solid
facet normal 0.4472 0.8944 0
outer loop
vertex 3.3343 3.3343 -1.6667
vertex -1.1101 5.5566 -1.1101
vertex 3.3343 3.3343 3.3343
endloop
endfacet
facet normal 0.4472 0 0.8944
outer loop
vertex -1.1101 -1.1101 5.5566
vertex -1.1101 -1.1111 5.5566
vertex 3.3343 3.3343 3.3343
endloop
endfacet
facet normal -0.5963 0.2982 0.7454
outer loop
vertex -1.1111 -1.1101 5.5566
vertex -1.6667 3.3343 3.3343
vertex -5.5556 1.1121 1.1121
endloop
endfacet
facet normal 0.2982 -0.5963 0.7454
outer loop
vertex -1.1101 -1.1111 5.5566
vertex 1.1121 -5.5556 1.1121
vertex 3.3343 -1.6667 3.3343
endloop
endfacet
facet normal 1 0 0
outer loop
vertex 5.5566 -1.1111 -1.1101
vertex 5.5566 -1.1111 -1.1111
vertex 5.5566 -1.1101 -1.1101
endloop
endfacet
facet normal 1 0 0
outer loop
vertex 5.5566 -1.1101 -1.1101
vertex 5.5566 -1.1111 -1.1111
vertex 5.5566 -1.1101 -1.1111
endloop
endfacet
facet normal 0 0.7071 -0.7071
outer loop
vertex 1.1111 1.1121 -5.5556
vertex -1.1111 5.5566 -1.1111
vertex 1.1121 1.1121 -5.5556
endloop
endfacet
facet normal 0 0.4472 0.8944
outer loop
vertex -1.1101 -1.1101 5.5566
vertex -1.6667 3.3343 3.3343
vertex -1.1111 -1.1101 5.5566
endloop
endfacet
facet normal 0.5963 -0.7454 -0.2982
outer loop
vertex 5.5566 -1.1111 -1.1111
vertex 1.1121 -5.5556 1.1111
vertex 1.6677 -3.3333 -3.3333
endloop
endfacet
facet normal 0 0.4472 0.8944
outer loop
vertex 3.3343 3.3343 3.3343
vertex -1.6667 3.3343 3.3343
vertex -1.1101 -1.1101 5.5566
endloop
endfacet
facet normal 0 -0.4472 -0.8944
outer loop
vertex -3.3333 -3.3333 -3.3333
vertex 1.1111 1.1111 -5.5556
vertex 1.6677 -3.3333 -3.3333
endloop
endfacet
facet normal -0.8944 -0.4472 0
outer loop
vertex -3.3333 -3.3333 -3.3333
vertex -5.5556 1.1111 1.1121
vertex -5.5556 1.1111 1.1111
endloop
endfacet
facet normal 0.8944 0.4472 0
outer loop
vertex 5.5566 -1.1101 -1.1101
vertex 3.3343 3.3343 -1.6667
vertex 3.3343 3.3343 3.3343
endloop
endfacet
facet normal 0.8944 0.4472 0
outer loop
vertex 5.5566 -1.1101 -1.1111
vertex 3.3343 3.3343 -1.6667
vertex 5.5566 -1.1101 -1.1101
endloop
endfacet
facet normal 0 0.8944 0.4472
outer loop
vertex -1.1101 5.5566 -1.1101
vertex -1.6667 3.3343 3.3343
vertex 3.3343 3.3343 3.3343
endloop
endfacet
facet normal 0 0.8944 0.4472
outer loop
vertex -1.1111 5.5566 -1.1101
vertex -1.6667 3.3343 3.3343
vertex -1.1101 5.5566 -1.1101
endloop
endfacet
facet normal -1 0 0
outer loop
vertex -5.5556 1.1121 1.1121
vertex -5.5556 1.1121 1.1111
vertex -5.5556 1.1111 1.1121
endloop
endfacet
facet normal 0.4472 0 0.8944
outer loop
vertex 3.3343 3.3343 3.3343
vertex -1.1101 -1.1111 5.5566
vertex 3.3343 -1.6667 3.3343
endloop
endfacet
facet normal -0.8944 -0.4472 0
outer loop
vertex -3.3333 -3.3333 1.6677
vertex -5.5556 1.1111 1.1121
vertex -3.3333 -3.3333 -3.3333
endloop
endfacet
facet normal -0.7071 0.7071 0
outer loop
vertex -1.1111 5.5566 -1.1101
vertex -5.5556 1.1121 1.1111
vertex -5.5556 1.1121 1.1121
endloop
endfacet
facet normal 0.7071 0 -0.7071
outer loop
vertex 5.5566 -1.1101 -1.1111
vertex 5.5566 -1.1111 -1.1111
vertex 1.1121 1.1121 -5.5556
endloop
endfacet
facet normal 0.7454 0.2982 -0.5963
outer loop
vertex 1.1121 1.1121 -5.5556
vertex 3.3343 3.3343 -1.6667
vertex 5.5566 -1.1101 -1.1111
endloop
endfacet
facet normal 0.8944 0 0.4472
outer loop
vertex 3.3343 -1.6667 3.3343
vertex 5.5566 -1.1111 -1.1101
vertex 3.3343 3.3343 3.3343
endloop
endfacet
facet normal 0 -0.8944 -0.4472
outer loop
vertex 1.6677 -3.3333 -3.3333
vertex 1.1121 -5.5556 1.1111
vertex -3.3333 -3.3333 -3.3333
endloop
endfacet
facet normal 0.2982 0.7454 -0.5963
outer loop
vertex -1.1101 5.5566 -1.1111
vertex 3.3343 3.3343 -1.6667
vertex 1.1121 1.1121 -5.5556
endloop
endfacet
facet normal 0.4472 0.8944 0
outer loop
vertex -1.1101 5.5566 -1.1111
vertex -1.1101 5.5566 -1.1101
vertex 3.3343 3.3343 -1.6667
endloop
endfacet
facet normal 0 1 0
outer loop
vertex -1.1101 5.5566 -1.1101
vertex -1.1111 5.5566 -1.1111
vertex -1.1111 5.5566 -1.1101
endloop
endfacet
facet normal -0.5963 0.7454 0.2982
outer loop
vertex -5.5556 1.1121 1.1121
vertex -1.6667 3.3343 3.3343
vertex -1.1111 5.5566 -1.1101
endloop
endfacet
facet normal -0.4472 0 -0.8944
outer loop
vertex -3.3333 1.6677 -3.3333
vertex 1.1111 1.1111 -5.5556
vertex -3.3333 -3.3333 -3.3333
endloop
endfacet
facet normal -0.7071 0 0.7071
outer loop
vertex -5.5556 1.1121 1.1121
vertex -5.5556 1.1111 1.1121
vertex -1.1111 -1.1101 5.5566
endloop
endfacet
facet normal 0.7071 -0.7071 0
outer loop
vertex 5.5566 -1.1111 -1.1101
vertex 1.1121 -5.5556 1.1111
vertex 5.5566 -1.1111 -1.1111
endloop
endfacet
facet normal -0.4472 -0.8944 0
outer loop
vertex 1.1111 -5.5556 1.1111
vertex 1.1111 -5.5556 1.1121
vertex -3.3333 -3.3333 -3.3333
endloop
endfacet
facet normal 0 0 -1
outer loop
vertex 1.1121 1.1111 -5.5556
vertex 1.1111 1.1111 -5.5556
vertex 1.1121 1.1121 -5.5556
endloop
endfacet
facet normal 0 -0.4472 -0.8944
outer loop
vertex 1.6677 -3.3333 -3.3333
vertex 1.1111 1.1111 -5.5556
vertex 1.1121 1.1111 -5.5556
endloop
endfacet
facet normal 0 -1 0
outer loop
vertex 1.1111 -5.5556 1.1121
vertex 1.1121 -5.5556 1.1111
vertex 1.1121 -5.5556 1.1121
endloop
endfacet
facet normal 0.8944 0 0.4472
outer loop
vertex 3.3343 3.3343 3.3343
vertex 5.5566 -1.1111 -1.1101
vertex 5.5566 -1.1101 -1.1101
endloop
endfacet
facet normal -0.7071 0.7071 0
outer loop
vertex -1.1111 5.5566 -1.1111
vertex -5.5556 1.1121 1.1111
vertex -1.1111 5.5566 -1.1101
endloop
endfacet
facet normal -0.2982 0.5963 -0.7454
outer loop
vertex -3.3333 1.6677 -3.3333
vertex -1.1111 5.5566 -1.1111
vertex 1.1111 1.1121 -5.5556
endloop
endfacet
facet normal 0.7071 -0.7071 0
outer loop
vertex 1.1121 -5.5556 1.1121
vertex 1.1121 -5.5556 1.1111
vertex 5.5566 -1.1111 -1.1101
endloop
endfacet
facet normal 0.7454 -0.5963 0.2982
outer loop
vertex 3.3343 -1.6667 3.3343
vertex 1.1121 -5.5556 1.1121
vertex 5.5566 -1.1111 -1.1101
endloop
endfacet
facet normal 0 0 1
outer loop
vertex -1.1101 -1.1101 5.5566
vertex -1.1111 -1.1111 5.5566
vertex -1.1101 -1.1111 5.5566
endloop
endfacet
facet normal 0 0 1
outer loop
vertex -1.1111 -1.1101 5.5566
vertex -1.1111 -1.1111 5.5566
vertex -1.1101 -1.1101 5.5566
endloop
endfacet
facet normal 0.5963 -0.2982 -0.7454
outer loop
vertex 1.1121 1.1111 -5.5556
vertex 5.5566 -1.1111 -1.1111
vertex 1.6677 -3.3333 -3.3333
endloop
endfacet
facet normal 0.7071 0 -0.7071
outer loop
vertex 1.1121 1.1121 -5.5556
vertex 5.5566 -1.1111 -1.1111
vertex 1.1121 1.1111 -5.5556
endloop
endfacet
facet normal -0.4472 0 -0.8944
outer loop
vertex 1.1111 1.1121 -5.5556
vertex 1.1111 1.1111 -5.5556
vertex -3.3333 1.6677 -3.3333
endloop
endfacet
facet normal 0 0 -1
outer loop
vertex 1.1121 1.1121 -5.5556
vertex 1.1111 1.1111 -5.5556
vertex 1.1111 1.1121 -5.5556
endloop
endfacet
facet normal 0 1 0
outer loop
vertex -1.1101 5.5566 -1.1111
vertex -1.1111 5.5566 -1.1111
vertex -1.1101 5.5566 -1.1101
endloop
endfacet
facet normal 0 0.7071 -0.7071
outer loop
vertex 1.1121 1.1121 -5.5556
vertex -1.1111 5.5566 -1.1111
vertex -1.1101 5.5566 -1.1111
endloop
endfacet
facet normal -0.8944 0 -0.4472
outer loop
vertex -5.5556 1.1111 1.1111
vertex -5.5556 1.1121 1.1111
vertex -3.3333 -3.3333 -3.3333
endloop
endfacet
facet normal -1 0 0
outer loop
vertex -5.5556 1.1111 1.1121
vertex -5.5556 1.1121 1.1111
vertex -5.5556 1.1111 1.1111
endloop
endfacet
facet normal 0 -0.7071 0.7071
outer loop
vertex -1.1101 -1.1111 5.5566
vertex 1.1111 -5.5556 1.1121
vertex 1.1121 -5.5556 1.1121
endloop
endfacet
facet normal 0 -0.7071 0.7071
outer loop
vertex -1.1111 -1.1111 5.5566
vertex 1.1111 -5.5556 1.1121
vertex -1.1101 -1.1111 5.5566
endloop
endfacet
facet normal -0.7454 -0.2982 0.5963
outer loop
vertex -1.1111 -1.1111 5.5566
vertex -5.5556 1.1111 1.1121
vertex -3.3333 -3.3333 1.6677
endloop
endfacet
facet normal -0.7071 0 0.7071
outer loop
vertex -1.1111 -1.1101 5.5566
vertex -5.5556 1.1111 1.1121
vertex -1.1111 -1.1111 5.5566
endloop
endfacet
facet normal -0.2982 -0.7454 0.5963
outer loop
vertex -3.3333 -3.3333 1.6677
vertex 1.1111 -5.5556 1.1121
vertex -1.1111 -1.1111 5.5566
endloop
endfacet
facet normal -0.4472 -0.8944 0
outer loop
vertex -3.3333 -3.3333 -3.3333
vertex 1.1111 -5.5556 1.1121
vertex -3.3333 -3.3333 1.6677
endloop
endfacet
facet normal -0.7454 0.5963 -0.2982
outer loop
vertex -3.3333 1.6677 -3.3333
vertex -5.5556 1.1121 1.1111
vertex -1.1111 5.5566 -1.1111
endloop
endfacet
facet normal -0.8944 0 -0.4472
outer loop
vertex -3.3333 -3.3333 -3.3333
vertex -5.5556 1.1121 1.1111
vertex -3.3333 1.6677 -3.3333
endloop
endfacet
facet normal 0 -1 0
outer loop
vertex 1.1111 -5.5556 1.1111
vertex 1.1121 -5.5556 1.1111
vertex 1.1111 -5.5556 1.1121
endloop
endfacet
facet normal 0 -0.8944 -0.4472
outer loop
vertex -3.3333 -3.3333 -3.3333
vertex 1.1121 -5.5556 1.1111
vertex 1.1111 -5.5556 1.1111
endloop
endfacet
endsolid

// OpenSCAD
module convex_poly(l) {
     hull() { for (point=l) translate (point) cube(0.0001); }
};

// compute the sum of a list of vectors
function sum_vects(l) = (len(l) == 0) ? [0,0,0] :
     sum_vects([for (i = [0:1:len(l)-2]) l[i]]) + l[len(l)-1];

// Todo : generate with a rec module
permdual4 = [[-5/9, 1/9, 1/9],
 [-1/3, -1/3, 1/6],
 [-1/9, -1/9, 5/9],
 [5/9, -1/9, -1/9],
 [1/3, 1/3, -1/6],
 [1/6, -1/3, -1/3],
 [1/3, -1/6, 1/3],
 [-1/3, -1/3, -1/3],
 [-1/3, 1/6, -1/3],
 [1/3, 1/3, 1/3],
 [1/9, -5/9, 1/9],
 [-1/9, 5/9, -1/9],
 [-1/6, 1/3, 1/3],
 [1/9, 1/9, -5/9]];
     


// projection matrix 4D -> 3D
// projmatrix = [[1, 0, 0], [0, 1, 0], [0, 0, 1], [-1/3, -1/3, -1/3]];

scale(10) convex_poly(permdual4);
